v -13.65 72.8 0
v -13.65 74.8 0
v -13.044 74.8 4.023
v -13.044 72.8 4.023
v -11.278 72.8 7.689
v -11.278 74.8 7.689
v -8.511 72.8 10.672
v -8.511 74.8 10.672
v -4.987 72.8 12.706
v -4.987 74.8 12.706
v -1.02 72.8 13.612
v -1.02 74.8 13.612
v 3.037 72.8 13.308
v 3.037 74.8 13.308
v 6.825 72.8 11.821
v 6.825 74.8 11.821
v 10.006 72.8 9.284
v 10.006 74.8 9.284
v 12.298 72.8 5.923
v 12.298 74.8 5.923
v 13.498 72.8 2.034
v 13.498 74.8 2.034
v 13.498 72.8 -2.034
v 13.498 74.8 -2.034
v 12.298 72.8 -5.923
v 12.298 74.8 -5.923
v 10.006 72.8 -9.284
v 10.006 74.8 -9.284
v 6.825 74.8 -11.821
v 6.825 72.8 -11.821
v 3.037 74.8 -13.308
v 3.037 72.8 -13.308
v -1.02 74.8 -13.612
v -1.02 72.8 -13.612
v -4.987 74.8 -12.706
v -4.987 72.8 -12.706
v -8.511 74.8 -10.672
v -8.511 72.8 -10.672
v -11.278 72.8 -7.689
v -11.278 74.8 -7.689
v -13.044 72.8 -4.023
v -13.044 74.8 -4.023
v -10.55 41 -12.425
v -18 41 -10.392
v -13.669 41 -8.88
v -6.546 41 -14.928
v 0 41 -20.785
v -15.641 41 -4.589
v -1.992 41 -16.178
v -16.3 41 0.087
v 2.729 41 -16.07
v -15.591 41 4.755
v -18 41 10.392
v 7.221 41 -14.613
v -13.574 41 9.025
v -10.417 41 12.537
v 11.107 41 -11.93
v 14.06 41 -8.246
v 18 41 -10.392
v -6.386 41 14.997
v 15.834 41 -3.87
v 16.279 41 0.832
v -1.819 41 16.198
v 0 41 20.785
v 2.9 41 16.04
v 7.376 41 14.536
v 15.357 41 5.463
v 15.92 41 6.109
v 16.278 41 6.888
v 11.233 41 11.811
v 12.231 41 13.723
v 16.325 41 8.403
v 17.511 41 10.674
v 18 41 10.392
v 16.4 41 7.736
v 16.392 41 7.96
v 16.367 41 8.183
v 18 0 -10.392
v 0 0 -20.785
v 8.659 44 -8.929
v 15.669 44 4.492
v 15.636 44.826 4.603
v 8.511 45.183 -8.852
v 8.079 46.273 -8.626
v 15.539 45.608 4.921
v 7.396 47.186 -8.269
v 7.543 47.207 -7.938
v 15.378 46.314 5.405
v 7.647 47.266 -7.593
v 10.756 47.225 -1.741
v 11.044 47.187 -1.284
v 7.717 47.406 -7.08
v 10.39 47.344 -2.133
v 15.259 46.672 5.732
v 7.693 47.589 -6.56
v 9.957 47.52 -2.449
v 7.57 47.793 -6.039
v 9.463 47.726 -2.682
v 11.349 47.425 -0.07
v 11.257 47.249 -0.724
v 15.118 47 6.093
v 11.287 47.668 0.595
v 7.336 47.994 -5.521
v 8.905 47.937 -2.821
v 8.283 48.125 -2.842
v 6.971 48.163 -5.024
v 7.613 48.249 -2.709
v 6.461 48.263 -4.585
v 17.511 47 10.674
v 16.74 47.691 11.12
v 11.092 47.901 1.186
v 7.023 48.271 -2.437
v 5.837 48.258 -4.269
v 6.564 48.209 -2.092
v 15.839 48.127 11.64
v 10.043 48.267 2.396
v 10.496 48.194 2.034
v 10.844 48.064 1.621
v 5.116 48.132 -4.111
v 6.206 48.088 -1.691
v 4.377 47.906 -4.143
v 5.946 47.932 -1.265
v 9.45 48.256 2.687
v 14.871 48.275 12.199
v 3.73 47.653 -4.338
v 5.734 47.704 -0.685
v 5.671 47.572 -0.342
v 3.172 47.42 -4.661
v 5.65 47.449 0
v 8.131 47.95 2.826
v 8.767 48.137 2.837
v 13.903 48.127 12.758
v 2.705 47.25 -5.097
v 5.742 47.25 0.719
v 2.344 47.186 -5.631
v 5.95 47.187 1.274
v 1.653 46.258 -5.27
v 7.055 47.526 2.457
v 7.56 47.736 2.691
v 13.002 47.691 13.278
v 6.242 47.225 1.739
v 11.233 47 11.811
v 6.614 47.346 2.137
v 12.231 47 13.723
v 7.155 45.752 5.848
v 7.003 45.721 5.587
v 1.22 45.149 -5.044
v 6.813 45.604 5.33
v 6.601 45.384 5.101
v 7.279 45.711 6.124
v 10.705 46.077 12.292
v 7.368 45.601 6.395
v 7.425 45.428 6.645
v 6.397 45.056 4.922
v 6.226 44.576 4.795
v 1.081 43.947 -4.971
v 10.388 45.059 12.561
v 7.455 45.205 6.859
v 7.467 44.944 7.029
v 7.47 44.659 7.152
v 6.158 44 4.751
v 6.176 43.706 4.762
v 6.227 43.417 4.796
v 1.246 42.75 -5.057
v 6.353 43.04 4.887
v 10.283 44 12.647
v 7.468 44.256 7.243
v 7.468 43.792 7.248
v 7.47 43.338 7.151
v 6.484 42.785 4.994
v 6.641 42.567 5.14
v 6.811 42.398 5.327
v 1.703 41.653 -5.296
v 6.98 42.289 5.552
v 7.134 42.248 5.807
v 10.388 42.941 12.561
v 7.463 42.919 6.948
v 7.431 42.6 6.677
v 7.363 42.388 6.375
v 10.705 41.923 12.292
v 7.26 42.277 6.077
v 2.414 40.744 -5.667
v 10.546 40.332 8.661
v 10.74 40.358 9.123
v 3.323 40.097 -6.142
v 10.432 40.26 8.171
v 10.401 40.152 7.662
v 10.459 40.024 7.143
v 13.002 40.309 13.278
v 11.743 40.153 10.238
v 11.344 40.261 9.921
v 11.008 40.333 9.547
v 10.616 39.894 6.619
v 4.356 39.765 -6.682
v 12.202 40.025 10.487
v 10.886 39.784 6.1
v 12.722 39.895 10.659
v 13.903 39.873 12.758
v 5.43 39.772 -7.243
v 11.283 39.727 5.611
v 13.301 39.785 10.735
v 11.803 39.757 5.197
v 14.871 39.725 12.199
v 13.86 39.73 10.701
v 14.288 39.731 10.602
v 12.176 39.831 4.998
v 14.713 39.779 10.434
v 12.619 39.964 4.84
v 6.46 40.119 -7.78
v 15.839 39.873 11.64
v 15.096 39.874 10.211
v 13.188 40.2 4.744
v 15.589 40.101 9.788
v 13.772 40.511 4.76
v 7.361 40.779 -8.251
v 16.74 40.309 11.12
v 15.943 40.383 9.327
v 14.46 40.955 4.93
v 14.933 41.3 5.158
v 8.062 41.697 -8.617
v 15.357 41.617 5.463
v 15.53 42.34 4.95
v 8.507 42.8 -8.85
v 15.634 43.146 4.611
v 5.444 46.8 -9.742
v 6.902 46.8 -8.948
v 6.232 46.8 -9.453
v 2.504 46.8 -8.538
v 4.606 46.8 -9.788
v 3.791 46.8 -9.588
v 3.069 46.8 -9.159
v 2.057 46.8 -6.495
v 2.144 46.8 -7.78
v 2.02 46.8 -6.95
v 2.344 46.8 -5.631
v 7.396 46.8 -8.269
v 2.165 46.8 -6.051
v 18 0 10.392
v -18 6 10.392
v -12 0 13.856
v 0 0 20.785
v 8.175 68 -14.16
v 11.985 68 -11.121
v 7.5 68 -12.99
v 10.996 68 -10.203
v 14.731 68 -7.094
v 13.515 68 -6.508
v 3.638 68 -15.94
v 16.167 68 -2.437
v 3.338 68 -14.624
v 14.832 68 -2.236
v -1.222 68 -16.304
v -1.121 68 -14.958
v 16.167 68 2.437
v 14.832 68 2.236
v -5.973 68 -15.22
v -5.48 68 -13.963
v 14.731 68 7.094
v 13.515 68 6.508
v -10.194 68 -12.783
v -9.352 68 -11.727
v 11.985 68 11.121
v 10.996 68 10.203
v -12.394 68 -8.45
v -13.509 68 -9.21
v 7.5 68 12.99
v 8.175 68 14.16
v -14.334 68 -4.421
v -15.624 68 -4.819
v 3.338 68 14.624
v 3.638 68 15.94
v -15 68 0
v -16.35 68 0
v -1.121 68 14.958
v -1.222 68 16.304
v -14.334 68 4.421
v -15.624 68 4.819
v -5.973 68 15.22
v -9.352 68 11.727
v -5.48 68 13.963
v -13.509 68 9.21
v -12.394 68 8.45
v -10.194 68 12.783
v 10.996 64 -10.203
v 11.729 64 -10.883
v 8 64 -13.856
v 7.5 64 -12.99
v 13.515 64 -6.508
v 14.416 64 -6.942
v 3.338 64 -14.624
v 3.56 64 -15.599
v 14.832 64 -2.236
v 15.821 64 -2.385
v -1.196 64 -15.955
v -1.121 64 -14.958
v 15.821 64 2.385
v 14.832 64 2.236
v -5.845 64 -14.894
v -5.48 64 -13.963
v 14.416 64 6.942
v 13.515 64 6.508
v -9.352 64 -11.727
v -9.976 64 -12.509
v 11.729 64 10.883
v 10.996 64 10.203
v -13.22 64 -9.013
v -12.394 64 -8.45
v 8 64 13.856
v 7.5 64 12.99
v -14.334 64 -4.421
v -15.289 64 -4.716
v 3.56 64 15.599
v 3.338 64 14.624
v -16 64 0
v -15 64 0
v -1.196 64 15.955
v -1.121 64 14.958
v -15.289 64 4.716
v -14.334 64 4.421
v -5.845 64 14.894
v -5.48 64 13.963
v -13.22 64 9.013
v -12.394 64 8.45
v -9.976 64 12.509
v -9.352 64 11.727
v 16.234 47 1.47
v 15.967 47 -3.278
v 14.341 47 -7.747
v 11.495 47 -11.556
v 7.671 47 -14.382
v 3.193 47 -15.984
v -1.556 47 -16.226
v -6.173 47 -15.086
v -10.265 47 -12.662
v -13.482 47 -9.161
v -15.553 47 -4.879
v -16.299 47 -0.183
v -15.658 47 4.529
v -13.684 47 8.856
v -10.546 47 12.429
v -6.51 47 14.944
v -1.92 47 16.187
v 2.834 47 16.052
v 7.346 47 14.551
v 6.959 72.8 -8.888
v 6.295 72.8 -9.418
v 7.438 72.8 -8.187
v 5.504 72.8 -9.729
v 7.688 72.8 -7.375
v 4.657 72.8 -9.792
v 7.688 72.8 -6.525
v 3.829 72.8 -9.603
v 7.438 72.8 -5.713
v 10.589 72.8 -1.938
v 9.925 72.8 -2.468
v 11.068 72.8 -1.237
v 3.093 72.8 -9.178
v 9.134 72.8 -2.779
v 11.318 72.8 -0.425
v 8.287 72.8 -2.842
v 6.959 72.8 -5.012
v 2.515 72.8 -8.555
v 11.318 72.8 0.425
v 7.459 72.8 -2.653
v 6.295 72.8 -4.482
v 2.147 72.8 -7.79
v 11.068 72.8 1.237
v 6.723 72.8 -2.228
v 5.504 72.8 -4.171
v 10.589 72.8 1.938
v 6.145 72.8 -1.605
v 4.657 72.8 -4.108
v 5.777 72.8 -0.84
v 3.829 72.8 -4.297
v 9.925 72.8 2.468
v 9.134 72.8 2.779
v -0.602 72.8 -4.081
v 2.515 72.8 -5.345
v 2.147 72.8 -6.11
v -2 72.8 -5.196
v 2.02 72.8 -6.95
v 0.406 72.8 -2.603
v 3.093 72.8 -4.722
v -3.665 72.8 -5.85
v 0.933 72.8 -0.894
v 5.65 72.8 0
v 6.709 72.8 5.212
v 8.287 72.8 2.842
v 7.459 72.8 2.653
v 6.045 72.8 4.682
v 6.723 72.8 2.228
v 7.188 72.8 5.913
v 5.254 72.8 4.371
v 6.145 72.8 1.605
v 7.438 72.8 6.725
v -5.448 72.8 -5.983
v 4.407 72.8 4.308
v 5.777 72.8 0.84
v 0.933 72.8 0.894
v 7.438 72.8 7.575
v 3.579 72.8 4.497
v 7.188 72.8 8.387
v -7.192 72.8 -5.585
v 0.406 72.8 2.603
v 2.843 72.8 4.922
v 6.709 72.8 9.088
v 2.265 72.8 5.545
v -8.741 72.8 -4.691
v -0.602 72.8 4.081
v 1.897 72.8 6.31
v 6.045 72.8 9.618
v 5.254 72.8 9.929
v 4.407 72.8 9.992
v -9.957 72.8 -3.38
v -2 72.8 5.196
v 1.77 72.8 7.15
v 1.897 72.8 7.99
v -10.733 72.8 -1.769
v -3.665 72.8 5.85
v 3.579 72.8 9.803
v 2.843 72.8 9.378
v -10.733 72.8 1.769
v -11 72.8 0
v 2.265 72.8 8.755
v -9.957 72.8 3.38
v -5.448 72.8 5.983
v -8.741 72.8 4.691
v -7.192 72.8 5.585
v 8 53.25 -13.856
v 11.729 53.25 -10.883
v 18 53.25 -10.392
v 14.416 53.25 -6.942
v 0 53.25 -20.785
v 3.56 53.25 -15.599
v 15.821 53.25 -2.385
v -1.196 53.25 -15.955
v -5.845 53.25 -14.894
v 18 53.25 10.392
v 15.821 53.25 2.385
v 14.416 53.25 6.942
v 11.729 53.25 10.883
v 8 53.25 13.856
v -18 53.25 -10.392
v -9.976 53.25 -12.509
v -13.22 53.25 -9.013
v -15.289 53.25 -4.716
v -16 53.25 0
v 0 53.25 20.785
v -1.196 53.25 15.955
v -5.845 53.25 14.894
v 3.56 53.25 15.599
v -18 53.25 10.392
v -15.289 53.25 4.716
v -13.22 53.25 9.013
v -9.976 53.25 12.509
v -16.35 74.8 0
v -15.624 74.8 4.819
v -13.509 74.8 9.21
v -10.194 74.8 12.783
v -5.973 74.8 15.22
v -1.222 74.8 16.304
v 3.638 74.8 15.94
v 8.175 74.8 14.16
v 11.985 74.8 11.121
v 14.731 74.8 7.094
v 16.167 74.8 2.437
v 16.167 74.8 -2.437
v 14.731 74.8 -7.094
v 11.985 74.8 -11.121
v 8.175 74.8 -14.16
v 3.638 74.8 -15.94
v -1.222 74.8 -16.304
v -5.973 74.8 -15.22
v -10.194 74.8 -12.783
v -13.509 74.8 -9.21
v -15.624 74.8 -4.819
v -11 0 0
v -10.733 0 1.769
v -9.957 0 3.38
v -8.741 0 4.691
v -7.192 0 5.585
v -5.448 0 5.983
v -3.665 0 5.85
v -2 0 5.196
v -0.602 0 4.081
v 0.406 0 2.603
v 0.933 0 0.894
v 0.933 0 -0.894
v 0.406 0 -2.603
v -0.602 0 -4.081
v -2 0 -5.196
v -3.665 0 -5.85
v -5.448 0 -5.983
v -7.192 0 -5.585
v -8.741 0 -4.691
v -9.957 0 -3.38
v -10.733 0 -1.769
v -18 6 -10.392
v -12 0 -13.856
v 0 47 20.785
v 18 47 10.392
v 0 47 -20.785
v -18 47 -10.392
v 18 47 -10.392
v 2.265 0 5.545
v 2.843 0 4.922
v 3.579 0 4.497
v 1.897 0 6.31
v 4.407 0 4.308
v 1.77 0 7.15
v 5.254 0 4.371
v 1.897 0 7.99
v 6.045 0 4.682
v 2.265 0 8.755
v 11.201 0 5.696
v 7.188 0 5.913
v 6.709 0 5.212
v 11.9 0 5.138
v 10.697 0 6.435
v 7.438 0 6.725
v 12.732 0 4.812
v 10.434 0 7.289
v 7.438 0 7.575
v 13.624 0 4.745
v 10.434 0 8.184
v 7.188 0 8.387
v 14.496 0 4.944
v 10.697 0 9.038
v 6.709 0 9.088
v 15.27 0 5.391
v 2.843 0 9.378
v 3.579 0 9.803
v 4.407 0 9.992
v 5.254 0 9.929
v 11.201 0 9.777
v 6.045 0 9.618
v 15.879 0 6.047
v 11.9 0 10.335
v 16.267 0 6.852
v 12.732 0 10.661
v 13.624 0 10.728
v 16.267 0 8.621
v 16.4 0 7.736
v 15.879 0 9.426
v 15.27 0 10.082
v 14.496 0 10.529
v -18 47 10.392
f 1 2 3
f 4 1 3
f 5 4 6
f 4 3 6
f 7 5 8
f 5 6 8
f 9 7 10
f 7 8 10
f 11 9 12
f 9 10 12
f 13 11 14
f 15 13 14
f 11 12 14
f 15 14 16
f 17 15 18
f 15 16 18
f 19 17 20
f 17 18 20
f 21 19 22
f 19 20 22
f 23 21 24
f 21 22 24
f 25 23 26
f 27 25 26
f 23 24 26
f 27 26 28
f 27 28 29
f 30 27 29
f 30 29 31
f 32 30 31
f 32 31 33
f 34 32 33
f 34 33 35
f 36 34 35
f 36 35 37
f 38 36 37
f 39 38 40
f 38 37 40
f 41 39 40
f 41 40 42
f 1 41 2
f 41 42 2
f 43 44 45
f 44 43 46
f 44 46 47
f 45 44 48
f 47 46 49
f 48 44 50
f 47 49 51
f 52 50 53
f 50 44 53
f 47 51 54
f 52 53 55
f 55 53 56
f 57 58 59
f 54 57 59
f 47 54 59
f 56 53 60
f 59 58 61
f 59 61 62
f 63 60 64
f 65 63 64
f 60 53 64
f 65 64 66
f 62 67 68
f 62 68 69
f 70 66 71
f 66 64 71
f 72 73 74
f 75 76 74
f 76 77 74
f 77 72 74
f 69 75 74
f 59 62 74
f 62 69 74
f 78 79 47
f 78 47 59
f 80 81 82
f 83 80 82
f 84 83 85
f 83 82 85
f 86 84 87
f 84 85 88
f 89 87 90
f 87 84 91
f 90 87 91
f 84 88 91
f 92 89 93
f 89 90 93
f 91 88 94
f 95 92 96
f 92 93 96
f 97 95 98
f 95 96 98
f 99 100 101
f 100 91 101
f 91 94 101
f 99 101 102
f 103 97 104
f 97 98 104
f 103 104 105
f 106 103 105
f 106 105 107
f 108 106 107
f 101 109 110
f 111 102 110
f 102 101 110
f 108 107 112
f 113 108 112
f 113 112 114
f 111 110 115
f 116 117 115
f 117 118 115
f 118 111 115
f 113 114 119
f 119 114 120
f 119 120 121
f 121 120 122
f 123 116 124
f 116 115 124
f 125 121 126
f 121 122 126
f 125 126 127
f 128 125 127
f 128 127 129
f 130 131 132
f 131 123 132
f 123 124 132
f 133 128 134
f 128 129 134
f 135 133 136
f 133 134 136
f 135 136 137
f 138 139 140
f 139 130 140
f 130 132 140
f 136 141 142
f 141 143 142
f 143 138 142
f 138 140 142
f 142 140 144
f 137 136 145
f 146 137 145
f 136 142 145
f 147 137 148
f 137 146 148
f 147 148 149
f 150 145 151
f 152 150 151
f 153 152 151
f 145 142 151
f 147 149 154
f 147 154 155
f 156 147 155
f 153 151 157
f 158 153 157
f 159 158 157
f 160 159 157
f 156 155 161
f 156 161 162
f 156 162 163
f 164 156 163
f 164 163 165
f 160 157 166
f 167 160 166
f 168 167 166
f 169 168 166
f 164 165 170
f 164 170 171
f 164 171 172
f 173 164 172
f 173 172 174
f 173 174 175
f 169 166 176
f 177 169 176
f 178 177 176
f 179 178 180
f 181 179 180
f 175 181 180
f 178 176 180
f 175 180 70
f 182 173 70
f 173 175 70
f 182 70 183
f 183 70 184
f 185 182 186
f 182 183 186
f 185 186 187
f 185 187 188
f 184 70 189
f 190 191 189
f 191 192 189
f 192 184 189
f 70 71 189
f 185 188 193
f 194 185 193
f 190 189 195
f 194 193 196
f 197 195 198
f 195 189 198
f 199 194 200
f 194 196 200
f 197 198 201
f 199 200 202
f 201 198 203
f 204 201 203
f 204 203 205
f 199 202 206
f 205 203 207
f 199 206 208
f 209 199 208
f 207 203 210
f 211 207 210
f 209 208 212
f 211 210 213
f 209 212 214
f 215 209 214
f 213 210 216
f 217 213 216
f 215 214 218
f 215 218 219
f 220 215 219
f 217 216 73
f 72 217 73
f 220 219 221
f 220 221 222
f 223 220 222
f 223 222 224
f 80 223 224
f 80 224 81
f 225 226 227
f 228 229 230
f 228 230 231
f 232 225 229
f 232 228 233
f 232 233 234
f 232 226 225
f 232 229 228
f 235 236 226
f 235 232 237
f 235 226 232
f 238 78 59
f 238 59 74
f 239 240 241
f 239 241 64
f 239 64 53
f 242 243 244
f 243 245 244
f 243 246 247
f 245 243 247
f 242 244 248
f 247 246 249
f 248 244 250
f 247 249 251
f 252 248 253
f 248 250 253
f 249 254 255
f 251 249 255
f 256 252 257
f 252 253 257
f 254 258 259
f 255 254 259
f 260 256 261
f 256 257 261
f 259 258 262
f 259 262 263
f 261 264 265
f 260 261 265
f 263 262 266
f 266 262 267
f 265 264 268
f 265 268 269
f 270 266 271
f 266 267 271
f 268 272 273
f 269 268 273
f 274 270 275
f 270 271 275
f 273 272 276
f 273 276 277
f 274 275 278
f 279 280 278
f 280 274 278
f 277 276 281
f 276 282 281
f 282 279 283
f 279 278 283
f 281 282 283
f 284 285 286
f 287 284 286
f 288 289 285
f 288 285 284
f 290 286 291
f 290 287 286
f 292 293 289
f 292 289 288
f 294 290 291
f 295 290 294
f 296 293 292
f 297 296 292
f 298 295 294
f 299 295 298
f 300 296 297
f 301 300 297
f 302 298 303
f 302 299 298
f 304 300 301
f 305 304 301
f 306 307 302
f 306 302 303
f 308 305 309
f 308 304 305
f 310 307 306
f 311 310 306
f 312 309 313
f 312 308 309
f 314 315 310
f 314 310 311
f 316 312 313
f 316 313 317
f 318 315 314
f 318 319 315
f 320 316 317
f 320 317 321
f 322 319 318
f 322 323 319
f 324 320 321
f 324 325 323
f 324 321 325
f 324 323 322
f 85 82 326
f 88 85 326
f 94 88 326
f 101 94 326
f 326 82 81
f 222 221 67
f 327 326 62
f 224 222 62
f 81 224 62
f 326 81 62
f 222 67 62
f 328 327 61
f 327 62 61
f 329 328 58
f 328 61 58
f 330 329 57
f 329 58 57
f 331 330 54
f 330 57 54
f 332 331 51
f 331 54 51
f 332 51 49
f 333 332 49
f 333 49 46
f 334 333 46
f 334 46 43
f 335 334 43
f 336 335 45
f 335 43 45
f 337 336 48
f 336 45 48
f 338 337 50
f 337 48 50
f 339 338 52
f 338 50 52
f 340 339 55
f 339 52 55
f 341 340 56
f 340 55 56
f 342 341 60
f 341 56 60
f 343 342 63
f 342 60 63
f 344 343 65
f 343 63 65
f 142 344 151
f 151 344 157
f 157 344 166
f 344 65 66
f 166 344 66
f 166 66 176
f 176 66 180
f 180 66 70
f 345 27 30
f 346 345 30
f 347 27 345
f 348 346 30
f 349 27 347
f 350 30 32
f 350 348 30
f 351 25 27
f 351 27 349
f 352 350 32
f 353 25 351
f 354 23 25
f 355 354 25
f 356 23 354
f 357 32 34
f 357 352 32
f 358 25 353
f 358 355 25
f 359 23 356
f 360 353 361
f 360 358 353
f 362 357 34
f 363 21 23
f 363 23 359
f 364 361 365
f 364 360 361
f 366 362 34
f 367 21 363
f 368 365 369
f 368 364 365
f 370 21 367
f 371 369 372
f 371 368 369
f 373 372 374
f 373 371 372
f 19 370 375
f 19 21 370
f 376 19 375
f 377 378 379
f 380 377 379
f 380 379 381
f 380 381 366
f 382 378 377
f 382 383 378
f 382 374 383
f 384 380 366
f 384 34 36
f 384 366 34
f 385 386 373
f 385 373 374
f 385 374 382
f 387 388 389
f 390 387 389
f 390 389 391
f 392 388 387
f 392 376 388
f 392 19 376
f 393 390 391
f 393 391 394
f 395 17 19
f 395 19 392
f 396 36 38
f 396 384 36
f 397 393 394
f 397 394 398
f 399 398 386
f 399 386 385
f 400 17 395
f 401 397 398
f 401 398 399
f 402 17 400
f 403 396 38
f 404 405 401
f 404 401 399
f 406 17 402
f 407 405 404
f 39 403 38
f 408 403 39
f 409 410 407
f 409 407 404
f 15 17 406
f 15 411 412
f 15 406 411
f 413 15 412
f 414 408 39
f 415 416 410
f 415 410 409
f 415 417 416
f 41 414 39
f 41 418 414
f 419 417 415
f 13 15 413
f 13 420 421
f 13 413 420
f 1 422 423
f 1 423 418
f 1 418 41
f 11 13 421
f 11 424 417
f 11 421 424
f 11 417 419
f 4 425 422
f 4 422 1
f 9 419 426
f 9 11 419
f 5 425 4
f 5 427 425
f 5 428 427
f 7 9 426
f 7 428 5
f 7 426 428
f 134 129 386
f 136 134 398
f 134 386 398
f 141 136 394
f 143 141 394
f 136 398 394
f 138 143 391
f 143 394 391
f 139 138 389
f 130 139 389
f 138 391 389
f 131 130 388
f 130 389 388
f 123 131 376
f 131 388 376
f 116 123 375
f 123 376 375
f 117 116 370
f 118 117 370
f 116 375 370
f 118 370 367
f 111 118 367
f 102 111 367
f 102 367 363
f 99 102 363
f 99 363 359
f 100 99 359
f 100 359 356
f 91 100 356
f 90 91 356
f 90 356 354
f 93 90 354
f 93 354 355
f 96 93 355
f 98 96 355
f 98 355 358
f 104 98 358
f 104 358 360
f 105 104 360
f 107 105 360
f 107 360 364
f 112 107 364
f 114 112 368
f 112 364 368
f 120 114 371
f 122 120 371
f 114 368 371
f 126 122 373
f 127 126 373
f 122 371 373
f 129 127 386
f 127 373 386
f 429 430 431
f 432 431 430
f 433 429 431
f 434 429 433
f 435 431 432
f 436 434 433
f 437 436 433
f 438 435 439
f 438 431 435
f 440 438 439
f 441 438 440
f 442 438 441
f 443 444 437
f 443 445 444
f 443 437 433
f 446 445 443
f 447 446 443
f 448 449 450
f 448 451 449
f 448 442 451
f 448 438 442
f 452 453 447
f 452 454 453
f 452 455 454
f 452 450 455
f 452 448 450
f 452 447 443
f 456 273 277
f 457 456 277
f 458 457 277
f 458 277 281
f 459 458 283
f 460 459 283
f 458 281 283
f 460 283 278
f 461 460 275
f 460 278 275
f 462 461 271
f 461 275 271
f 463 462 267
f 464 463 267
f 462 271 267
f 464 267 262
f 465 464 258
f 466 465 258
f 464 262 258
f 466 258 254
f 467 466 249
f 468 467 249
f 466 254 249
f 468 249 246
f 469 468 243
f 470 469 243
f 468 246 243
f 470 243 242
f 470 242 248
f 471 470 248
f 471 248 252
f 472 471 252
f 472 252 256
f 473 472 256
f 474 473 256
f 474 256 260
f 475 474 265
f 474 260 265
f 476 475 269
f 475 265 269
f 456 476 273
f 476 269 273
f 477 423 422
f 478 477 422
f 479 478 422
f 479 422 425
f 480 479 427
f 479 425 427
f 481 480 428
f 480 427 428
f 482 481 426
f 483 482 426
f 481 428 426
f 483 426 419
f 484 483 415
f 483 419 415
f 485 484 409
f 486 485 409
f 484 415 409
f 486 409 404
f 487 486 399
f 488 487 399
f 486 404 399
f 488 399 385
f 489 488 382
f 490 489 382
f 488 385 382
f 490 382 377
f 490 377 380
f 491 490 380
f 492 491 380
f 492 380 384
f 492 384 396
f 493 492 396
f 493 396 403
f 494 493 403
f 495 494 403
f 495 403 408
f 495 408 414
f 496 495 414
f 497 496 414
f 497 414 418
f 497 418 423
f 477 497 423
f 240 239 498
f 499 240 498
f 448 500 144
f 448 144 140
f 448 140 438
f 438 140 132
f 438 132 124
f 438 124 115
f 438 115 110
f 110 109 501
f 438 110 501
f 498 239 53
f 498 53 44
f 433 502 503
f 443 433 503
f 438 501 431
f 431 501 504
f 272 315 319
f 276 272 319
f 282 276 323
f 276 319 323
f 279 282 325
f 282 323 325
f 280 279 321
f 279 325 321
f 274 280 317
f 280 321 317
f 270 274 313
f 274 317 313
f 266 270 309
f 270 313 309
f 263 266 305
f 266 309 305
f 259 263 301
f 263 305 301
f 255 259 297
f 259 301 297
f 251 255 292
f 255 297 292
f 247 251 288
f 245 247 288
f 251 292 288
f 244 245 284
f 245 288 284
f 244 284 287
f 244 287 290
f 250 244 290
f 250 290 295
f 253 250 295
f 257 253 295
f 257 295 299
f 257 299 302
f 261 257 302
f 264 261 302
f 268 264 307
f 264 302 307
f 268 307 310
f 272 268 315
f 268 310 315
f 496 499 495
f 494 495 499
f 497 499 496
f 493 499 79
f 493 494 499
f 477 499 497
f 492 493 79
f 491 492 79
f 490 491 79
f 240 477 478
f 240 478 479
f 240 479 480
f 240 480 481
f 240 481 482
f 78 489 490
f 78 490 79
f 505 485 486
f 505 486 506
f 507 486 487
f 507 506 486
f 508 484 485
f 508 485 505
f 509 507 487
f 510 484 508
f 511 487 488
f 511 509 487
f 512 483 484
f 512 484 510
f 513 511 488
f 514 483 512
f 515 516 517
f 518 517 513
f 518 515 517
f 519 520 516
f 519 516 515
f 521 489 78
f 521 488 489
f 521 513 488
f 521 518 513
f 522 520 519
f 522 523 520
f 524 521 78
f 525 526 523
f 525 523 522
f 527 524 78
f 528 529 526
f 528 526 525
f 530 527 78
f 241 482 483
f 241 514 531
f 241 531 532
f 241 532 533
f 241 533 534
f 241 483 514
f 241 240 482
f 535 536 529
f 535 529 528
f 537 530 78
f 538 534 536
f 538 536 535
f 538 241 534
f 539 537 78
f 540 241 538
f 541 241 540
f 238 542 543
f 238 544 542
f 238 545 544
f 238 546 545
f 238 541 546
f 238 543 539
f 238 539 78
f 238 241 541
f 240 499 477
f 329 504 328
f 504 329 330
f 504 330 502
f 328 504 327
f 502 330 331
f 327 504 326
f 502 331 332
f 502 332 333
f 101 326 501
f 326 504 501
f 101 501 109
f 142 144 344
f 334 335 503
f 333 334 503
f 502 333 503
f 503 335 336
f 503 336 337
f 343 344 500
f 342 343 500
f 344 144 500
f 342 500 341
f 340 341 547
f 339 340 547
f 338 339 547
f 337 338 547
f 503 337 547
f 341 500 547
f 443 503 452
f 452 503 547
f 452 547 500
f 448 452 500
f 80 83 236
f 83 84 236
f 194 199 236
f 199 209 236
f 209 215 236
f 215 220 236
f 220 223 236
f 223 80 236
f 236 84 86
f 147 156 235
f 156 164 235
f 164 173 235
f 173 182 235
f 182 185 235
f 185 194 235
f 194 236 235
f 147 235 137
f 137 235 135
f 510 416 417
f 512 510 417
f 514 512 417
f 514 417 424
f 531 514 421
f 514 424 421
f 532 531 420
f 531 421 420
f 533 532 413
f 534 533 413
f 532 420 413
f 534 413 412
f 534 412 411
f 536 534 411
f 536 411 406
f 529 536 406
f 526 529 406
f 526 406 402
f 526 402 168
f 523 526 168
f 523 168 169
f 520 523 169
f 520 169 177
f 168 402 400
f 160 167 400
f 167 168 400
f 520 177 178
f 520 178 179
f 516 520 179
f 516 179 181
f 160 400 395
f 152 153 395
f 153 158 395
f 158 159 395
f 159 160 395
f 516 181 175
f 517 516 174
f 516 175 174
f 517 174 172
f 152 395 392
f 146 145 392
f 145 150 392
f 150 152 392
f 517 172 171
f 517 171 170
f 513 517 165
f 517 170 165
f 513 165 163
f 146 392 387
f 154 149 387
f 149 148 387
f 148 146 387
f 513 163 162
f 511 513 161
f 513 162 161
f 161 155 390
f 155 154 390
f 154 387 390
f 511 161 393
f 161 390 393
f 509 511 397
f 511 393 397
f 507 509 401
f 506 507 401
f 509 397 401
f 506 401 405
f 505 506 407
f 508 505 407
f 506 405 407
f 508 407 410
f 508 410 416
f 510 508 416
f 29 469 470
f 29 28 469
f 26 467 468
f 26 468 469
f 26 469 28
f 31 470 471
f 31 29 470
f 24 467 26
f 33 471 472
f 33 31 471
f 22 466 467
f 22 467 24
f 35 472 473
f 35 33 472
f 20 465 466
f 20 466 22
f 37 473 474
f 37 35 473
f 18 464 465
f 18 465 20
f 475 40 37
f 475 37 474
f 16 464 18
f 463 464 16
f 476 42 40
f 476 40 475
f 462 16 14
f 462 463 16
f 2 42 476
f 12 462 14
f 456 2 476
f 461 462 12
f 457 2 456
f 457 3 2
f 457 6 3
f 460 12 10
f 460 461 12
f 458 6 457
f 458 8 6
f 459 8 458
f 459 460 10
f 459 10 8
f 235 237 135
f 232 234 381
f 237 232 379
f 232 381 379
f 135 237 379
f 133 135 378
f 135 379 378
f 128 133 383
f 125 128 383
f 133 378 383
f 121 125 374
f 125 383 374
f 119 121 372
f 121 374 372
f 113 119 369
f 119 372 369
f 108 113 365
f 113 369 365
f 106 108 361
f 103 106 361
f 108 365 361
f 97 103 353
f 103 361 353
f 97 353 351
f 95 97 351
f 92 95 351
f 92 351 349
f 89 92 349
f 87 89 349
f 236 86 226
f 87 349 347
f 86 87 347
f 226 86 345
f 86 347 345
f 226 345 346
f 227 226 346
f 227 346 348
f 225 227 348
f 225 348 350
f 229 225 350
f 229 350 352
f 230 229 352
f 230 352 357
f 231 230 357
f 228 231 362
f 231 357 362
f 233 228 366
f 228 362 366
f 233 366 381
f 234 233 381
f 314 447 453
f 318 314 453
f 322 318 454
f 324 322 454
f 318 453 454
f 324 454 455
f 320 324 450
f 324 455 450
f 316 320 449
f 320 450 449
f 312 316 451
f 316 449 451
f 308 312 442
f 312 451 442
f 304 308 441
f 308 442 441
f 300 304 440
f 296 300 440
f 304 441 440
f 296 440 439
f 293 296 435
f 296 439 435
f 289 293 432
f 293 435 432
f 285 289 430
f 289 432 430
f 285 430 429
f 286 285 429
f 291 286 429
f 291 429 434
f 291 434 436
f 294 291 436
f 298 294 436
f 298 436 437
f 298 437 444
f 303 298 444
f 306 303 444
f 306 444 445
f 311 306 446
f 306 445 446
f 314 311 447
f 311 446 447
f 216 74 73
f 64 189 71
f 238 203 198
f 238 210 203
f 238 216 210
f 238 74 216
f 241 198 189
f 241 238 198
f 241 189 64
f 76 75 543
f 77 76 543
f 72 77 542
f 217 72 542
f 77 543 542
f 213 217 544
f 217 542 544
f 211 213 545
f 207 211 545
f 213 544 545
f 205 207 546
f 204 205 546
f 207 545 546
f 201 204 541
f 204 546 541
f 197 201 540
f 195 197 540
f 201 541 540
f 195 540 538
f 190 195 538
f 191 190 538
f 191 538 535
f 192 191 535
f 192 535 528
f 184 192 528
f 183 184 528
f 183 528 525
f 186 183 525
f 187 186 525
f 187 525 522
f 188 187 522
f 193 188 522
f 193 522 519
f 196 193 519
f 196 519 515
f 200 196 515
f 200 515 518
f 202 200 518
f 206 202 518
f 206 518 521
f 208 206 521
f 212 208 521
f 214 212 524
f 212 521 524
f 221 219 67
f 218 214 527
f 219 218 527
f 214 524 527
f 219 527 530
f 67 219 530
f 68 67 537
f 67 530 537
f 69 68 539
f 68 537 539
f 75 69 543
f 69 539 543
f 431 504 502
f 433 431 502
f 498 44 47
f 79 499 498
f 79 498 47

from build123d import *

# Parameters (mm, degrees)
F1_DEPTH  = 41
F2_R      = 16.3
F3_DEPTH  = 6
F5_DEPTH  = 6.25
F6_R      = 16
F7_DEPTH  = 10.75
F8_R      = 15
F9_DEPTH  = 4
F10_R     = 16.35
F11_DEPTH = 6.8
F12_R     = 13.65
F13_DEPTH = 2
F14_R     = 6
F15_DEPTH = 72.801
F16_R     = 2.85
F17_DEPTH = 26
F21_R     = 3
F22_DEPTH = 45
F23_SIZE  = 6
F24_R     = 2.85
F25_DEPTH = 72.8010001


with BuildPart() as f1:
    # F0 (on Front) → F1 (new body)
    with BuildSketch(Plane.XZ):
        Polygon((0, -20.7846096908), (18, -10.3923048454), (18, 10.3923048454), (0, 20.7846096908), (-18, 10.3923048454), (-18, -10.3923048454), align=None)
    extrude(amount=-F1_DEPTH)

    # F2 (on face) → F3 (join)
    with BuildSketch(Plane(origin=(0, 41, 0), x_dir=(-1, 0, 0), z_dir=(0, 1, 0))):
        Circle(F2_R)
    extrude(amount=F3_DEPTH)

    # F4 (on face) → F5 (join)
    with BuildSketch(Plane(origin=(0, 47, 0), x_dir=(-1, 0, 0), z_dir=(0, 1, 0))):
        Polygon((0, -20.7846096908), (18, -10.3923048454), (18, 10.3923048454), (0, 20.7846096908), (-18, 10.3923048454), (-18, -10.3923048454), align=None)
    extrude(amount=F5_DEPTH)

    # F6 (on face) → F7 (join)
    with BuildSketch(Plane(origin=(0, 53.25, 0), x_dir=(-1, 0, 0), z_dir=(0, 1, 0))):
        Circle(F6_R)
    extrude(amount=F7_DEPTH)

    # F8 (on face) → F9 (join)
    with BuildSketch(Plane(origin=(0, 64, 0), x_dir=(-1, 0, 0), z_dir=(0, 1, 0))):
        Circle(F8_R)
    extrude(amount=F9_DEPTH)

    # F10 (on face) → F11 (join)
    with BuildSketch(Plane(origin=(0, 68, 0), x_dir=(-1, 0, 0), z_dir=(0, 1, 0))):
        Circle(F10_R)
    extrude(amount=F11_DEPTH)

    # F12 (on face) → F13 (cut)
    with BuildSketch(Plane(origin=(0, 74.8, 0), x_dir=(-1, 0, 0), z_dir=(0, 1, 0))):
        Circle(F12_R)
    extrude(amount=-F13_DEPTH, mode=Mode.SUBTRACT)

    # F14 (on face) → F15 (cut, through all)
    with BuildSketch(Plane(origin=(0, 72.8, 0), x_dir=(-1, 0, 0), z_dir=(0, 1, 0))):
        with Locations((5, 0)):
            Circle(F14_R)
    extrude(amount=-F15_DEPTH, mode=Mode.SUBTRACT)

    # F16 (on face) → F17 (cut)
    with BuildSketch(Plane(origin=(0, 72.8, 0), x_dir=(-1, 0, 0), z_dir=(0, 1, 0))):
        with Locations((-4.87, -6.95)):
            Circle(F16_R)
        with Locations((-8.5, 0)):
            Circle(F16_R)
    extrude(amount=-F17_DEPTH, mode=Mode.SUBTRACT)

    # F19 (on offset) → F20 (revolve, cut)
    with BuildSketch(Plane.XZ.offset(-44)):
        Polygon((19.0103325466, 10.8889942077), (15.2210576437, 12.8681406677), (4.87, -6.95), (8.6592749029, -8.9291464601), align=None)
    revolve(axis=Axis((11.6872206375, 44, 6.1022543886), (0.4629582363, 0, 0.8863800942)), mode=Mode.SUBTRACT)

    # F21 (on face) → F22 (cut)
    with BuildSketch(Plane.XZ):
        with Locations((13.4, 7.7364936071)):
            Circle(F21_R)
    extrude(amount=-F22_DEPTH, mode=Mode.SUBTRACT)

    # F23
    f23_edges = [f1.edges().sort_by_distance(p)[0] for p in [
        (-18, 0, 0),
    ]]
    chamfer(f23_edges, length=F23_SIZE)

    # F24 (on face) → F25 (cut, through all)
    with BuildSketch(Plane(origin=(0, 72.8, 0), x_dir=(-1, 0, 0), z_dir=(0, 1, 0))):
        with Locations((-4.62, 7.15)):
            Circle(F24_R)
    extrude(amount=-F25_DEPTH, mode=Mode.SUBTRACT)


solid = f1.part
